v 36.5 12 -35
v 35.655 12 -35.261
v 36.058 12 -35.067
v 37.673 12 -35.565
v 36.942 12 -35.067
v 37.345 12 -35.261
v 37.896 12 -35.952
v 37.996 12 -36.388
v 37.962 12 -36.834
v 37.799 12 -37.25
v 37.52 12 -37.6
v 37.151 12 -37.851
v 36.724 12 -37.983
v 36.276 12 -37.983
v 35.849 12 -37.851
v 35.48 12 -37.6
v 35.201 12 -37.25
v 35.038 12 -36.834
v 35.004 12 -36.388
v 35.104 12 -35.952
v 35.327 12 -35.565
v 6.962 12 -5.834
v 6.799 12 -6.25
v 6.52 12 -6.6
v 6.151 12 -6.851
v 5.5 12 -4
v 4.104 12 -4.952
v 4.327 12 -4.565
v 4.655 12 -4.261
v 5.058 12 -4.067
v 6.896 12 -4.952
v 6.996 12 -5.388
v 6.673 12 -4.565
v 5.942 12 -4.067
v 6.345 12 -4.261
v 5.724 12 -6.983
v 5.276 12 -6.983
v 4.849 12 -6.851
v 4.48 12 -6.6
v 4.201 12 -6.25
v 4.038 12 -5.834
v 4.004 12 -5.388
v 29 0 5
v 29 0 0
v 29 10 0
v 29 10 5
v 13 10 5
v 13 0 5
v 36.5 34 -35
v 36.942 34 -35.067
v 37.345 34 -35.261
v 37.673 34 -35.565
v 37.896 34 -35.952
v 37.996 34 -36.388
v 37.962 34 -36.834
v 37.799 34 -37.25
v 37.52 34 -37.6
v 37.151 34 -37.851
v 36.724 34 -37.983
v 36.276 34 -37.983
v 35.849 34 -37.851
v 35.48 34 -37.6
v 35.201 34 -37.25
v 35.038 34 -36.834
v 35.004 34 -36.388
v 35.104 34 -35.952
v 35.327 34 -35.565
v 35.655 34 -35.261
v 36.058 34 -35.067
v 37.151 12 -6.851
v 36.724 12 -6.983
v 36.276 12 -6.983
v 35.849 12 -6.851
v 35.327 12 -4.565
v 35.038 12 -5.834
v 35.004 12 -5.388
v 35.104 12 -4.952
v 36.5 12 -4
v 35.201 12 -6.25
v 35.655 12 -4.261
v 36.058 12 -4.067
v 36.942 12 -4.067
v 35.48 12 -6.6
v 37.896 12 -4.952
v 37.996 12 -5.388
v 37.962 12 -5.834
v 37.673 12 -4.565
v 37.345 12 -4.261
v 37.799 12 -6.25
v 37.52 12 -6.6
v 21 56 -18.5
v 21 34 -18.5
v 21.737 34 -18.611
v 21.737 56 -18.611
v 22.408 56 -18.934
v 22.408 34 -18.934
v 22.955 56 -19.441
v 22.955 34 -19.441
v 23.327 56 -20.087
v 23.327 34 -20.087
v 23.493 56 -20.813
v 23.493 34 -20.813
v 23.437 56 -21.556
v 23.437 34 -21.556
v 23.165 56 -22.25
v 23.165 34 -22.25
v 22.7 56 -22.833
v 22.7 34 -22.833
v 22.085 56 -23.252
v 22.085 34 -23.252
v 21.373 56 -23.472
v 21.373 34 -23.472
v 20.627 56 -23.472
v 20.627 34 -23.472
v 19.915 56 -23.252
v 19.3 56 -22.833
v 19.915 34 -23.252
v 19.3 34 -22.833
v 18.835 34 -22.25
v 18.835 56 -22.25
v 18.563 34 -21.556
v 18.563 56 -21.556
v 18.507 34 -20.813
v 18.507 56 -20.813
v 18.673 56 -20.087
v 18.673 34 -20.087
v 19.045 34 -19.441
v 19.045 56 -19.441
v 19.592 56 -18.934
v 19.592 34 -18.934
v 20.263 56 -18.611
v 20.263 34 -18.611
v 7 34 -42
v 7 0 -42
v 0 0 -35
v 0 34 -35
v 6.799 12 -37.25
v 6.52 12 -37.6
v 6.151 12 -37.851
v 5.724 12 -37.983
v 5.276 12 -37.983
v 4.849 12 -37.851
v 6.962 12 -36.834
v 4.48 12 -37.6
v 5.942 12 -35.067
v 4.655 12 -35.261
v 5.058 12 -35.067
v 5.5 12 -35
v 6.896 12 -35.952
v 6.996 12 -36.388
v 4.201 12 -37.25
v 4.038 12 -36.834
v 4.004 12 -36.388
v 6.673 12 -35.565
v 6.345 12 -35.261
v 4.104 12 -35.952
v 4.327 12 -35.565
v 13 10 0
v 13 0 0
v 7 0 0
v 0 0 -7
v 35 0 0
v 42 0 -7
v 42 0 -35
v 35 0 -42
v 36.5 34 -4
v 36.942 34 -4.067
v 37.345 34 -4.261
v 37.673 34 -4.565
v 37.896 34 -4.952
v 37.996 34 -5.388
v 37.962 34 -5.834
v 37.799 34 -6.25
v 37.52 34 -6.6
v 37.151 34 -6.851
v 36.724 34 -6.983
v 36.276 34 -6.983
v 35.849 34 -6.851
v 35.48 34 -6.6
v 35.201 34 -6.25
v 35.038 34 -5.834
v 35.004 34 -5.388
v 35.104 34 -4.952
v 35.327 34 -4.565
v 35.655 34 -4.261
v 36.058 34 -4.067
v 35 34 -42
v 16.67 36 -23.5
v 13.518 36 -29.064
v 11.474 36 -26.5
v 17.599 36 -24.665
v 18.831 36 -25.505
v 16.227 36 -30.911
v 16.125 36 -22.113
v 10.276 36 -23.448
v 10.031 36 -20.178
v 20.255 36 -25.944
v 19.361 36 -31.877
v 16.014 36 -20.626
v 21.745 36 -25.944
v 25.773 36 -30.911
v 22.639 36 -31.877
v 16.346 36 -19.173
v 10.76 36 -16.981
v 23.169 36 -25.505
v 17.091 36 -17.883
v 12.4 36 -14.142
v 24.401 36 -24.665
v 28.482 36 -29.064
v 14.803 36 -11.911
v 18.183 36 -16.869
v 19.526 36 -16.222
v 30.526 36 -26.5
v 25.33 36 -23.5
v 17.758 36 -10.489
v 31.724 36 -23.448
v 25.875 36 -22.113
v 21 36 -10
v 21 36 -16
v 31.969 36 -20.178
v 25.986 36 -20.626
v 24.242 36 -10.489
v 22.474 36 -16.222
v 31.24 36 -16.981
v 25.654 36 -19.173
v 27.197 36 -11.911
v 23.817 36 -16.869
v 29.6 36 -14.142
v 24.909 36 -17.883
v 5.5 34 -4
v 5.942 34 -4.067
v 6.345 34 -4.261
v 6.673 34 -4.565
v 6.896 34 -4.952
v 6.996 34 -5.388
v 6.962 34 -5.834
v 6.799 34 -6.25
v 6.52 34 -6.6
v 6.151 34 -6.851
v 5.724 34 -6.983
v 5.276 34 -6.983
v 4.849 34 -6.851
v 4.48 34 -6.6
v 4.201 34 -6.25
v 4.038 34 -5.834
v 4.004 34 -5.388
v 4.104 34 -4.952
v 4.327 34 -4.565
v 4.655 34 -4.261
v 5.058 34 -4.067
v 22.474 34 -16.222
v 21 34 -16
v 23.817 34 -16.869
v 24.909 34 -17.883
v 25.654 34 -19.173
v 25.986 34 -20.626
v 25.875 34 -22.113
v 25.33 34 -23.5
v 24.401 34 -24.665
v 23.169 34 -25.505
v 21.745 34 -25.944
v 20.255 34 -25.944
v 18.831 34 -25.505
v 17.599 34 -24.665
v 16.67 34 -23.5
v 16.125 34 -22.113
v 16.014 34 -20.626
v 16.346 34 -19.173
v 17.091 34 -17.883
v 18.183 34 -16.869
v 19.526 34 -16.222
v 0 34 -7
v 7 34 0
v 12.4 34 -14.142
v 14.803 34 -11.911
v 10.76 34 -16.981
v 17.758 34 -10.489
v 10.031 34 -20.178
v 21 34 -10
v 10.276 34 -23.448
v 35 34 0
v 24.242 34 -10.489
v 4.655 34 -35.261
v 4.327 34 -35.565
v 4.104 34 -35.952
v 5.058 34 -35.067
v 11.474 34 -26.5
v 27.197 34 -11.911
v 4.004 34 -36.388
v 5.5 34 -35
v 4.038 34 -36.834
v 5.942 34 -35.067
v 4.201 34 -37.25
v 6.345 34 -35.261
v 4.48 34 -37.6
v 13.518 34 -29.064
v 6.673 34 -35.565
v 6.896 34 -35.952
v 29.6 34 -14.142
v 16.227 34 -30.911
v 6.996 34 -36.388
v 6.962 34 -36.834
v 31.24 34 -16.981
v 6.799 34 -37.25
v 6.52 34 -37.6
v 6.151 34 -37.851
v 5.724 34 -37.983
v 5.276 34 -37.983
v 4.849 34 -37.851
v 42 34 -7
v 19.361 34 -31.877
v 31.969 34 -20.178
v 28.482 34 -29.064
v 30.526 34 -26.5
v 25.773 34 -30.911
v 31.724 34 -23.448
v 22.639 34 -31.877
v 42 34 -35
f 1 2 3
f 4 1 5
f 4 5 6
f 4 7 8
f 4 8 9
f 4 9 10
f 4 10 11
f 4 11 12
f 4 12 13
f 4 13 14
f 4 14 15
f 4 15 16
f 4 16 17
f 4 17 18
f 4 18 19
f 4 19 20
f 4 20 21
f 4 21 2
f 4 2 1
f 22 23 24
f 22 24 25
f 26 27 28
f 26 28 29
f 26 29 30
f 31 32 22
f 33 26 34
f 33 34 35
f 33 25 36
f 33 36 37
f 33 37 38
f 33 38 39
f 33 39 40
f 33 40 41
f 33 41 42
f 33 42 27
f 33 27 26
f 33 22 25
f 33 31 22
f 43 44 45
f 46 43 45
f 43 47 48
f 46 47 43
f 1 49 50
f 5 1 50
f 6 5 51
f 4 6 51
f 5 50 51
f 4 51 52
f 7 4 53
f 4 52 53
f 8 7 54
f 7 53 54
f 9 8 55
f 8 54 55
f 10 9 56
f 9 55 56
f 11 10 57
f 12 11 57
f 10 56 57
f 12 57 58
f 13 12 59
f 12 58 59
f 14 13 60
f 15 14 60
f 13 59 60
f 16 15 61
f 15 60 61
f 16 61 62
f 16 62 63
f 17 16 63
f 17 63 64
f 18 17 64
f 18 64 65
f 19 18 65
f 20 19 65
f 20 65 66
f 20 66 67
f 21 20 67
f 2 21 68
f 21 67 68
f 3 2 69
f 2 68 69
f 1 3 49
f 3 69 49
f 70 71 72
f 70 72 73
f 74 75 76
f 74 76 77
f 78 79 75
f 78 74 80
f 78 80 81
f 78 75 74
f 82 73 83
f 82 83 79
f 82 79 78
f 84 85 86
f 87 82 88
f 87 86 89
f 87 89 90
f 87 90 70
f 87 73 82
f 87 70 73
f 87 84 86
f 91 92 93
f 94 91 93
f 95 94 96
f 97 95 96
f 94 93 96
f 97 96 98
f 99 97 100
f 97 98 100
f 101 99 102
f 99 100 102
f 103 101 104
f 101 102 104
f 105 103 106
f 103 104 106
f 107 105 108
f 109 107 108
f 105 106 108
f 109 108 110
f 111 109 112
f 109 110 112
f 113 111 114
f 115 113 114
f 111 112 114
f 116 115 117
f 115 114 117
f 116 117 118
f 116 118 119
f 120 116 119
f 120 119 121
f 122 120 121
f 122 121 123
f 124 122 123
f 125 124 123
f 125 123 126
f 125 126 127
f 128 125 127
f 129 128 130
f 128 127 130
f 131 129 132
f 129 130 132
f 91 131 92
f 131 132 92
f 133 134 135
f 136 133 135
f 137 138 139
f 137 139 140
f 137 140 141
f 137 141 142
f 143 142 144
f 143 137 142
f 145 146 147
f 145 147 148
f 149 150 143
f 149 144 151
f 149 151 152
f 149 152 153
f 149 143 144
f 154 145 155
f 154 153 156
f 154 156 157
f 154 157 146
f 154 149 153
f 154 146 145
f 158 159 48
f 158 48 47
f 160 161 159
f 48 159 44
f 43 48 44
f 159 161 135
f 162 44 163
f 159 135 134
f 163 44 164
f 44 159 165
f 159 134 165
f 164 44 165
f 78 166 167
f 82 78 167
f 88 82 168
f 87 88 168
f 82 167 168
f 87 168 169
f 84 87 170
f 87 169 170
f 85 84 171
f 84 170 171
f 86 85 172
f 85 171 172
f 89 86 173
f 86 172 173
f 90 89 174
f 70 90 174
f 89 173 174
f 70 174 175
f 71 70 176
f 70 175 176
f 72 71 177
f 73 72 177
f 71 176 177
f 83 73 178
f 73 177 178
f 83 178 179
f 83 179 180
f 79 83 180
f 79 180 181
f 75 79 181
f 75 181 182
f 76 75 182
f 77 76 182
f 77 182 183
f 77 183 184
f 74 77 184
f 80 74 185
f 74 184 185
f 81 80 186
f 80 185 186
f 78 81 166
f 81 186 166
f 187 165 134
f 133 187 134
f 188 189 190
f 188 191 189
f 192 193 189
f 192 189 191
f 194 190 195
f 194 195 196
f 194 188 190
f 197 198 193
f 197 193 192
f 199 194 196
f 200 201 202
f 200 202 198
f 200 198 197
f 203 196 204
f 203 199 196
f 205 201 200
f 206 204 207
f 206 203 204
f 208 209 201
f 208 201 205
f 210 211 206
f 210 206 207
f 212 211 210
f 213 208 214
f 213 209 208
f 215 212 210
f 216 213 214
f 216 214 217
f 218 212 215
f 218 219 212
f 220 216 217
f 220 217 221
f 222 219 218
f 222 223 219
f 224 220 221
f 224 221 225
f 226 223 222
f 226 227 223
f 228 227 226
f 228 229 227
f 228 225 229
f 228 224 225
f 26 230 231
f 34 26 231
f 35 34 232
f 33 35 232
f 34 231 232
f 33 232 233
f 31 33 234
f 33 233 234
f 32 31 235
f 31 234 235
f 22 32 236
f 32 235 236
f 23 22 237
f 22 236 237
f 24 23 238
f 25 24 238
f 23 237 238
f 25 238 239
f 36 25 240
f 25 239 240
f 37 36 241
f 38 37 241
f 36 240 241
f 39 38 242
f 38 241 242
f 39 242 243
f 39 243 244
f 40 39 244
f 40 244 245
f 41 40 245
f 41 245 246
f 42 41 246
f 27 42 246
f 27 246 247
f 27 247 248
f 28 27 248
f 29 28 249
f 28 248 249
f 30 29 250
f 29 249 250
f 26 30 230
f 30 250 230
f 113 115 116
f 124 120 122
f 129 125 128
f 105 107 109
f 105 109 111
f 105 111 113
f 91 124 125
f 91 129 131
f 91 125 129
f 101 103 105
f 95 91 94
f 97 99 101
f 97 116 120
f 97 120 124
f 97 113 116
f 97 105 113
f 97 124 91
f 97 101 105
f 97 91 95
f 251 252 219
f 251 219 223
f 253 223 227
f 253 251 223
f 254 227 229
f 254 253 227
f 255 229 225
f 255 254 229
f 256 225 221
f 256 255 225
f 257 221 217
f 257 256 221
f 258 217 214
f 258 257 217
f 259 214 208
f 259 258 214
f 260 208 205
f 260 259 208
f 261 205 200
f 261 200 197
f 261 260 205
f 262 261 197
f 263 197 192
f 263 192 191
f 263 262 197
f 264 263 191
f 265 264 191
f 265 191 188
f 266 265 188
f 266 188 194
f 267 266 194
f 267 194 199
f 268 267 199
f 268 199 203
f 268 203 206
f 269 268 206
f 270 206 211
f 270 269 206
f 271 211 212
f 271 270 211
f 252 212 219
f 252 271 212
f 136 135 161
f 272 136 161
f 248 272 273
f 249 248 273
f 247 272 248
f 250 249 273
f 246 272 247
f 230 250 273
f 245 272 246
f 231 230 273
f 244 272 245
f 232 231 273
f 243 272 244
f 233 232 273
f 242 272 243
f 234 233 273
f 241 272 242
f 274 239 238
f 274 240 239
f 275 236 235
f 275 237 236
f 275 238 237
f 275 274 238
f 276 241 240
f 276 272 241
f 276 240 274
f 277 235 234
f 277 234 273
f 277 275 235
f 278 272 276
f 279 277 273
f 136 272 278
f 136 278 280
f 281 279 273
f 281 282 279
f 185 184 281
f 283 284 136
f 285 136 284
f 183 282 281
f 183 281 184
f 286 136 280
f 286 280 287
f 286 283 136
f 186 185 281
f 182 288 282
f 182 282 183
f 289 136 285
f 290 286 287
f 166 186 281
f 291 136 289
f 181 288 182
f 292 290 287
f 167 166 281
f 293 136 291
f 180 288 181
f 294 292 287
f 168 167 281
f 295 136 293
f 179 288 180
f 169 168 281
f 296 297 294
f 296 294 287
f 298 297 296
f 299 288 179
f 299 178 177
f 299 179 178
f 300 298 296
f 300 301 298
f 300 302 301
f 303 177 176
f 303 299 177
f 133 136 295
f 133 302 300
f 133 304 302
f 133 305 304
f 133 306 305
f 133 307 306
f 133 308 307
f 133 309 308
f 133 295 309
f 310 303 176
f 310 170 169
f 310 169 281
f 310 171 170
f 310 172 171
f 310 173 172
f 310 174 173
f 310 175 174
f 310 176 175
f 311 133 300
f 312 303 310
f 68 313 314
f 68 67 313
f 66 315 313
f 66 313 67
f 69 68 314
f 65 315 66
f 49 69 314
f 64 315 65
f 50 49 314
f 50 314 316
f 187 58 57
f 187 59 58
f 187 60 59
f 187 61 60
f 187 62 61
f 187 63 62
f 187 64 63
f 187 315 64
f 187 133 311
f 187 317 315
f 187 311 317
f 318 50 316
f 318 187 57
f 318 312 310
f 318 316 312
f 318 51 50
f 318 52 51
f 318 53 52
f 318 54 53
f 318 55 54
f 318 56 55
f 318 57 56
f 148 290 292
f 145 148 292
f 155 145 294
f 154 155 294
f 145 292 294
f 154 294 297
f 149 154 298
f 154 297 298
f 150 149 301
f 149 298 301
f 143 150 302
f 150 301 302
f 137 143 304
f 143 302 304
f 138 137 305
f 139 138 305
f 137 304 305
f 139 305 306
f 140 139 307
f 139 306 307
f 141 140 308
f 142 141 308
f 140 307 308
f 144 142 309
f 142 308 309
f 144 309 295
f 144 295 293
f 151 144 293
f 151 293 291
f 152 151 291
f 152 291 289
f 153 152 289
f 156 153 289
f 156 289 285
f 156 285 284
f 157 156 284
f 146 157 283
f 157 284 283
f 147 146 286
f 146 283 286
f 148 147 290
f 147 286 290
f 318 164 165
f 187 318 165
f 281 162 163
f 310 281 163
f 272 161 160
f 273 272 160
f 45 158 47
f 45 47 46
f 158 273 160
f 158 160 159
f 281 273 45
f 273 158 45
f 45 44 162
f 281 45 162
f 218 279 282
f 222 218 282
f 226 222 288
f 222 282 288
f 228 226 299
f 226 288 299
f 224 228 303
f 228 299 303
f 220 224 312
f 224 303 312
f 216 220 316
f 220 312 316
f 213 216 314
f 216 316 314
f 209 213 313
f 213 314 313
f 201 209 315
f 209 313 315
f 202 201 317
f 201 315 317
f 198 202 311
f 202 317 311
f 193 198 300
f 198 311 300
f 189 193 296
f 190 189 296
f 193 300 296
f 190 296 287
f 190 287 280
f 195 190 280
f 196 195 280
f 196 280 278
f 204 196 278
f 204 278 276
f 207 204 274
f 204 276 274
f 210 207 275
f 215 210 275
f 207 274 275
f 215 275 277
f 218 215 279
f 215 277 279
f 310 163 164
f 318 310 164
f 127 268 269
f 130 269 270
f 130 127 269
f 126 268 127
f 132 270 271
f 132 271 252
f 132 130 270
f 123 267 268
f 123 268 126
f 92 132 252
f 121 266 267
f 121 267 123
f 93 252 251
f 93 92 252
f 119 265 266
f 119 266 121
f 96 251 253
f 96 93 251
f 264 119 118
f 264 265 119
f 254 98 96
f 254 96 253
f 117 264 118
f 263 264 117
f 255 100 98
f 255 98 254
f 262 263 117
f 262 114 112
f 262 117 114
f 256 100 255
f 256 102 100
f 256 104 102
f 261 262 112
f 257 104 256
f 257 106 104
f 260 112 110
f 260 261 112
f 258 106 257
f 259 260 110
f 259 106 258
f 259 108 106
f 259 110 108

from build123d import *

# Parameters (mm, degrees)
BOSS_EXTRUDE1_DEPTH = 34
SKETCH2_W           = 16
SKETCH2_H           = 10
BOSS_EXTRUDE2_DEPTH = 5
SKETCH3_R           = 11
SKETCH3_R_2         = 5
BOSS_EXTRUDE3_DEPTH = 2
SKETCH4_R           = 2.5
BOSS_EXTRUDE4_DEPTH = 22
SKETCH5_R           = 1.5
CUT_EXTRUDE1_DEPTH  = 22


with BuildPart() as part:
    # Sketch1 → Boss-Extrude1 (new body)
    with BuildSketch(Plane(origin=(0, 0, 0), x_dir=(1, 0, 0), z_dir=(0, 1, 0))):
        Polygon((7, 42), (0, 35), (0, 7), (7, 0), (35, 0), (42, 7), (42, 35), (35, 42), align=None)
    extrude(amount=BOSS_EXTRUDE1_DEPTH)

    # Sketch2 → Boss-Extrude2 (add)
    with BuildSketch(Plane.XY):
        with Locations((21, 5)):
            Rectangle(SKETCH2_W, SKETCH2_H)
    extrude(amount=BOSS_EXTRUDE2_DEPTH)

    # Sketch3 → Boss-Extrude3 (add)
    with BuildSketch(Plane(origin=(0, 34, 0), x_dir=(1, 0, 0), z_dir=(0, 1, 0))):
        with Locations(Location((21, 21, 0), (0, 0, 270))):
            Circle(SKETCH3_R)
        with Locations(Location((21, 21, 0), (0, 0, 270))):
            Circle(SKETCH3_R_2, mode=Mode.SUBTRACT)
    extrude(amount=BOSS_EXTRUDE3_DEPTH)

    # Sketch4 → Boss-Extrude4 (add)
    with BuildSketch(Plane(origin=(0, 34, 0), x_dir=(1, 0, 0), z_dir=(0, 1, 0))):
        with Locations(Location((21, 21, 0), (0, 0, 270))):
            Circle(SKETCH4_R)
    extrude(amount=BOSS_EXTRUDE4_DEPTH)

    # Sketch5 → Cut-Extrude1 (cut)
    with BuildSketch(Plane(origin=(0, 34, 0), x_dir=(1, 0, 0), z_dir=(0, 1, 0))):
        with Locations(Location((5.5, 36.5, 0), (0, 0, 270))):
            Circle(SKETCH5_R)
        with Locations(Location((5.5, 5.5, 0), (0, 0, 270))):
            Circle(SKETCH5_R)
        with Locations(Location((36.5, 5.5, 0), (0, 0, 270))):
            Circle(SKETCH5_R)
        with Locations(Location((36.5, 36.5, 0), (0, 0, 270))):
            Circle(SKETCH5_R)
    extrude(amount=-CUT_EXTRUDE1_DEPTH, mode=Mode.SUBTRACT)


solid = part.part
